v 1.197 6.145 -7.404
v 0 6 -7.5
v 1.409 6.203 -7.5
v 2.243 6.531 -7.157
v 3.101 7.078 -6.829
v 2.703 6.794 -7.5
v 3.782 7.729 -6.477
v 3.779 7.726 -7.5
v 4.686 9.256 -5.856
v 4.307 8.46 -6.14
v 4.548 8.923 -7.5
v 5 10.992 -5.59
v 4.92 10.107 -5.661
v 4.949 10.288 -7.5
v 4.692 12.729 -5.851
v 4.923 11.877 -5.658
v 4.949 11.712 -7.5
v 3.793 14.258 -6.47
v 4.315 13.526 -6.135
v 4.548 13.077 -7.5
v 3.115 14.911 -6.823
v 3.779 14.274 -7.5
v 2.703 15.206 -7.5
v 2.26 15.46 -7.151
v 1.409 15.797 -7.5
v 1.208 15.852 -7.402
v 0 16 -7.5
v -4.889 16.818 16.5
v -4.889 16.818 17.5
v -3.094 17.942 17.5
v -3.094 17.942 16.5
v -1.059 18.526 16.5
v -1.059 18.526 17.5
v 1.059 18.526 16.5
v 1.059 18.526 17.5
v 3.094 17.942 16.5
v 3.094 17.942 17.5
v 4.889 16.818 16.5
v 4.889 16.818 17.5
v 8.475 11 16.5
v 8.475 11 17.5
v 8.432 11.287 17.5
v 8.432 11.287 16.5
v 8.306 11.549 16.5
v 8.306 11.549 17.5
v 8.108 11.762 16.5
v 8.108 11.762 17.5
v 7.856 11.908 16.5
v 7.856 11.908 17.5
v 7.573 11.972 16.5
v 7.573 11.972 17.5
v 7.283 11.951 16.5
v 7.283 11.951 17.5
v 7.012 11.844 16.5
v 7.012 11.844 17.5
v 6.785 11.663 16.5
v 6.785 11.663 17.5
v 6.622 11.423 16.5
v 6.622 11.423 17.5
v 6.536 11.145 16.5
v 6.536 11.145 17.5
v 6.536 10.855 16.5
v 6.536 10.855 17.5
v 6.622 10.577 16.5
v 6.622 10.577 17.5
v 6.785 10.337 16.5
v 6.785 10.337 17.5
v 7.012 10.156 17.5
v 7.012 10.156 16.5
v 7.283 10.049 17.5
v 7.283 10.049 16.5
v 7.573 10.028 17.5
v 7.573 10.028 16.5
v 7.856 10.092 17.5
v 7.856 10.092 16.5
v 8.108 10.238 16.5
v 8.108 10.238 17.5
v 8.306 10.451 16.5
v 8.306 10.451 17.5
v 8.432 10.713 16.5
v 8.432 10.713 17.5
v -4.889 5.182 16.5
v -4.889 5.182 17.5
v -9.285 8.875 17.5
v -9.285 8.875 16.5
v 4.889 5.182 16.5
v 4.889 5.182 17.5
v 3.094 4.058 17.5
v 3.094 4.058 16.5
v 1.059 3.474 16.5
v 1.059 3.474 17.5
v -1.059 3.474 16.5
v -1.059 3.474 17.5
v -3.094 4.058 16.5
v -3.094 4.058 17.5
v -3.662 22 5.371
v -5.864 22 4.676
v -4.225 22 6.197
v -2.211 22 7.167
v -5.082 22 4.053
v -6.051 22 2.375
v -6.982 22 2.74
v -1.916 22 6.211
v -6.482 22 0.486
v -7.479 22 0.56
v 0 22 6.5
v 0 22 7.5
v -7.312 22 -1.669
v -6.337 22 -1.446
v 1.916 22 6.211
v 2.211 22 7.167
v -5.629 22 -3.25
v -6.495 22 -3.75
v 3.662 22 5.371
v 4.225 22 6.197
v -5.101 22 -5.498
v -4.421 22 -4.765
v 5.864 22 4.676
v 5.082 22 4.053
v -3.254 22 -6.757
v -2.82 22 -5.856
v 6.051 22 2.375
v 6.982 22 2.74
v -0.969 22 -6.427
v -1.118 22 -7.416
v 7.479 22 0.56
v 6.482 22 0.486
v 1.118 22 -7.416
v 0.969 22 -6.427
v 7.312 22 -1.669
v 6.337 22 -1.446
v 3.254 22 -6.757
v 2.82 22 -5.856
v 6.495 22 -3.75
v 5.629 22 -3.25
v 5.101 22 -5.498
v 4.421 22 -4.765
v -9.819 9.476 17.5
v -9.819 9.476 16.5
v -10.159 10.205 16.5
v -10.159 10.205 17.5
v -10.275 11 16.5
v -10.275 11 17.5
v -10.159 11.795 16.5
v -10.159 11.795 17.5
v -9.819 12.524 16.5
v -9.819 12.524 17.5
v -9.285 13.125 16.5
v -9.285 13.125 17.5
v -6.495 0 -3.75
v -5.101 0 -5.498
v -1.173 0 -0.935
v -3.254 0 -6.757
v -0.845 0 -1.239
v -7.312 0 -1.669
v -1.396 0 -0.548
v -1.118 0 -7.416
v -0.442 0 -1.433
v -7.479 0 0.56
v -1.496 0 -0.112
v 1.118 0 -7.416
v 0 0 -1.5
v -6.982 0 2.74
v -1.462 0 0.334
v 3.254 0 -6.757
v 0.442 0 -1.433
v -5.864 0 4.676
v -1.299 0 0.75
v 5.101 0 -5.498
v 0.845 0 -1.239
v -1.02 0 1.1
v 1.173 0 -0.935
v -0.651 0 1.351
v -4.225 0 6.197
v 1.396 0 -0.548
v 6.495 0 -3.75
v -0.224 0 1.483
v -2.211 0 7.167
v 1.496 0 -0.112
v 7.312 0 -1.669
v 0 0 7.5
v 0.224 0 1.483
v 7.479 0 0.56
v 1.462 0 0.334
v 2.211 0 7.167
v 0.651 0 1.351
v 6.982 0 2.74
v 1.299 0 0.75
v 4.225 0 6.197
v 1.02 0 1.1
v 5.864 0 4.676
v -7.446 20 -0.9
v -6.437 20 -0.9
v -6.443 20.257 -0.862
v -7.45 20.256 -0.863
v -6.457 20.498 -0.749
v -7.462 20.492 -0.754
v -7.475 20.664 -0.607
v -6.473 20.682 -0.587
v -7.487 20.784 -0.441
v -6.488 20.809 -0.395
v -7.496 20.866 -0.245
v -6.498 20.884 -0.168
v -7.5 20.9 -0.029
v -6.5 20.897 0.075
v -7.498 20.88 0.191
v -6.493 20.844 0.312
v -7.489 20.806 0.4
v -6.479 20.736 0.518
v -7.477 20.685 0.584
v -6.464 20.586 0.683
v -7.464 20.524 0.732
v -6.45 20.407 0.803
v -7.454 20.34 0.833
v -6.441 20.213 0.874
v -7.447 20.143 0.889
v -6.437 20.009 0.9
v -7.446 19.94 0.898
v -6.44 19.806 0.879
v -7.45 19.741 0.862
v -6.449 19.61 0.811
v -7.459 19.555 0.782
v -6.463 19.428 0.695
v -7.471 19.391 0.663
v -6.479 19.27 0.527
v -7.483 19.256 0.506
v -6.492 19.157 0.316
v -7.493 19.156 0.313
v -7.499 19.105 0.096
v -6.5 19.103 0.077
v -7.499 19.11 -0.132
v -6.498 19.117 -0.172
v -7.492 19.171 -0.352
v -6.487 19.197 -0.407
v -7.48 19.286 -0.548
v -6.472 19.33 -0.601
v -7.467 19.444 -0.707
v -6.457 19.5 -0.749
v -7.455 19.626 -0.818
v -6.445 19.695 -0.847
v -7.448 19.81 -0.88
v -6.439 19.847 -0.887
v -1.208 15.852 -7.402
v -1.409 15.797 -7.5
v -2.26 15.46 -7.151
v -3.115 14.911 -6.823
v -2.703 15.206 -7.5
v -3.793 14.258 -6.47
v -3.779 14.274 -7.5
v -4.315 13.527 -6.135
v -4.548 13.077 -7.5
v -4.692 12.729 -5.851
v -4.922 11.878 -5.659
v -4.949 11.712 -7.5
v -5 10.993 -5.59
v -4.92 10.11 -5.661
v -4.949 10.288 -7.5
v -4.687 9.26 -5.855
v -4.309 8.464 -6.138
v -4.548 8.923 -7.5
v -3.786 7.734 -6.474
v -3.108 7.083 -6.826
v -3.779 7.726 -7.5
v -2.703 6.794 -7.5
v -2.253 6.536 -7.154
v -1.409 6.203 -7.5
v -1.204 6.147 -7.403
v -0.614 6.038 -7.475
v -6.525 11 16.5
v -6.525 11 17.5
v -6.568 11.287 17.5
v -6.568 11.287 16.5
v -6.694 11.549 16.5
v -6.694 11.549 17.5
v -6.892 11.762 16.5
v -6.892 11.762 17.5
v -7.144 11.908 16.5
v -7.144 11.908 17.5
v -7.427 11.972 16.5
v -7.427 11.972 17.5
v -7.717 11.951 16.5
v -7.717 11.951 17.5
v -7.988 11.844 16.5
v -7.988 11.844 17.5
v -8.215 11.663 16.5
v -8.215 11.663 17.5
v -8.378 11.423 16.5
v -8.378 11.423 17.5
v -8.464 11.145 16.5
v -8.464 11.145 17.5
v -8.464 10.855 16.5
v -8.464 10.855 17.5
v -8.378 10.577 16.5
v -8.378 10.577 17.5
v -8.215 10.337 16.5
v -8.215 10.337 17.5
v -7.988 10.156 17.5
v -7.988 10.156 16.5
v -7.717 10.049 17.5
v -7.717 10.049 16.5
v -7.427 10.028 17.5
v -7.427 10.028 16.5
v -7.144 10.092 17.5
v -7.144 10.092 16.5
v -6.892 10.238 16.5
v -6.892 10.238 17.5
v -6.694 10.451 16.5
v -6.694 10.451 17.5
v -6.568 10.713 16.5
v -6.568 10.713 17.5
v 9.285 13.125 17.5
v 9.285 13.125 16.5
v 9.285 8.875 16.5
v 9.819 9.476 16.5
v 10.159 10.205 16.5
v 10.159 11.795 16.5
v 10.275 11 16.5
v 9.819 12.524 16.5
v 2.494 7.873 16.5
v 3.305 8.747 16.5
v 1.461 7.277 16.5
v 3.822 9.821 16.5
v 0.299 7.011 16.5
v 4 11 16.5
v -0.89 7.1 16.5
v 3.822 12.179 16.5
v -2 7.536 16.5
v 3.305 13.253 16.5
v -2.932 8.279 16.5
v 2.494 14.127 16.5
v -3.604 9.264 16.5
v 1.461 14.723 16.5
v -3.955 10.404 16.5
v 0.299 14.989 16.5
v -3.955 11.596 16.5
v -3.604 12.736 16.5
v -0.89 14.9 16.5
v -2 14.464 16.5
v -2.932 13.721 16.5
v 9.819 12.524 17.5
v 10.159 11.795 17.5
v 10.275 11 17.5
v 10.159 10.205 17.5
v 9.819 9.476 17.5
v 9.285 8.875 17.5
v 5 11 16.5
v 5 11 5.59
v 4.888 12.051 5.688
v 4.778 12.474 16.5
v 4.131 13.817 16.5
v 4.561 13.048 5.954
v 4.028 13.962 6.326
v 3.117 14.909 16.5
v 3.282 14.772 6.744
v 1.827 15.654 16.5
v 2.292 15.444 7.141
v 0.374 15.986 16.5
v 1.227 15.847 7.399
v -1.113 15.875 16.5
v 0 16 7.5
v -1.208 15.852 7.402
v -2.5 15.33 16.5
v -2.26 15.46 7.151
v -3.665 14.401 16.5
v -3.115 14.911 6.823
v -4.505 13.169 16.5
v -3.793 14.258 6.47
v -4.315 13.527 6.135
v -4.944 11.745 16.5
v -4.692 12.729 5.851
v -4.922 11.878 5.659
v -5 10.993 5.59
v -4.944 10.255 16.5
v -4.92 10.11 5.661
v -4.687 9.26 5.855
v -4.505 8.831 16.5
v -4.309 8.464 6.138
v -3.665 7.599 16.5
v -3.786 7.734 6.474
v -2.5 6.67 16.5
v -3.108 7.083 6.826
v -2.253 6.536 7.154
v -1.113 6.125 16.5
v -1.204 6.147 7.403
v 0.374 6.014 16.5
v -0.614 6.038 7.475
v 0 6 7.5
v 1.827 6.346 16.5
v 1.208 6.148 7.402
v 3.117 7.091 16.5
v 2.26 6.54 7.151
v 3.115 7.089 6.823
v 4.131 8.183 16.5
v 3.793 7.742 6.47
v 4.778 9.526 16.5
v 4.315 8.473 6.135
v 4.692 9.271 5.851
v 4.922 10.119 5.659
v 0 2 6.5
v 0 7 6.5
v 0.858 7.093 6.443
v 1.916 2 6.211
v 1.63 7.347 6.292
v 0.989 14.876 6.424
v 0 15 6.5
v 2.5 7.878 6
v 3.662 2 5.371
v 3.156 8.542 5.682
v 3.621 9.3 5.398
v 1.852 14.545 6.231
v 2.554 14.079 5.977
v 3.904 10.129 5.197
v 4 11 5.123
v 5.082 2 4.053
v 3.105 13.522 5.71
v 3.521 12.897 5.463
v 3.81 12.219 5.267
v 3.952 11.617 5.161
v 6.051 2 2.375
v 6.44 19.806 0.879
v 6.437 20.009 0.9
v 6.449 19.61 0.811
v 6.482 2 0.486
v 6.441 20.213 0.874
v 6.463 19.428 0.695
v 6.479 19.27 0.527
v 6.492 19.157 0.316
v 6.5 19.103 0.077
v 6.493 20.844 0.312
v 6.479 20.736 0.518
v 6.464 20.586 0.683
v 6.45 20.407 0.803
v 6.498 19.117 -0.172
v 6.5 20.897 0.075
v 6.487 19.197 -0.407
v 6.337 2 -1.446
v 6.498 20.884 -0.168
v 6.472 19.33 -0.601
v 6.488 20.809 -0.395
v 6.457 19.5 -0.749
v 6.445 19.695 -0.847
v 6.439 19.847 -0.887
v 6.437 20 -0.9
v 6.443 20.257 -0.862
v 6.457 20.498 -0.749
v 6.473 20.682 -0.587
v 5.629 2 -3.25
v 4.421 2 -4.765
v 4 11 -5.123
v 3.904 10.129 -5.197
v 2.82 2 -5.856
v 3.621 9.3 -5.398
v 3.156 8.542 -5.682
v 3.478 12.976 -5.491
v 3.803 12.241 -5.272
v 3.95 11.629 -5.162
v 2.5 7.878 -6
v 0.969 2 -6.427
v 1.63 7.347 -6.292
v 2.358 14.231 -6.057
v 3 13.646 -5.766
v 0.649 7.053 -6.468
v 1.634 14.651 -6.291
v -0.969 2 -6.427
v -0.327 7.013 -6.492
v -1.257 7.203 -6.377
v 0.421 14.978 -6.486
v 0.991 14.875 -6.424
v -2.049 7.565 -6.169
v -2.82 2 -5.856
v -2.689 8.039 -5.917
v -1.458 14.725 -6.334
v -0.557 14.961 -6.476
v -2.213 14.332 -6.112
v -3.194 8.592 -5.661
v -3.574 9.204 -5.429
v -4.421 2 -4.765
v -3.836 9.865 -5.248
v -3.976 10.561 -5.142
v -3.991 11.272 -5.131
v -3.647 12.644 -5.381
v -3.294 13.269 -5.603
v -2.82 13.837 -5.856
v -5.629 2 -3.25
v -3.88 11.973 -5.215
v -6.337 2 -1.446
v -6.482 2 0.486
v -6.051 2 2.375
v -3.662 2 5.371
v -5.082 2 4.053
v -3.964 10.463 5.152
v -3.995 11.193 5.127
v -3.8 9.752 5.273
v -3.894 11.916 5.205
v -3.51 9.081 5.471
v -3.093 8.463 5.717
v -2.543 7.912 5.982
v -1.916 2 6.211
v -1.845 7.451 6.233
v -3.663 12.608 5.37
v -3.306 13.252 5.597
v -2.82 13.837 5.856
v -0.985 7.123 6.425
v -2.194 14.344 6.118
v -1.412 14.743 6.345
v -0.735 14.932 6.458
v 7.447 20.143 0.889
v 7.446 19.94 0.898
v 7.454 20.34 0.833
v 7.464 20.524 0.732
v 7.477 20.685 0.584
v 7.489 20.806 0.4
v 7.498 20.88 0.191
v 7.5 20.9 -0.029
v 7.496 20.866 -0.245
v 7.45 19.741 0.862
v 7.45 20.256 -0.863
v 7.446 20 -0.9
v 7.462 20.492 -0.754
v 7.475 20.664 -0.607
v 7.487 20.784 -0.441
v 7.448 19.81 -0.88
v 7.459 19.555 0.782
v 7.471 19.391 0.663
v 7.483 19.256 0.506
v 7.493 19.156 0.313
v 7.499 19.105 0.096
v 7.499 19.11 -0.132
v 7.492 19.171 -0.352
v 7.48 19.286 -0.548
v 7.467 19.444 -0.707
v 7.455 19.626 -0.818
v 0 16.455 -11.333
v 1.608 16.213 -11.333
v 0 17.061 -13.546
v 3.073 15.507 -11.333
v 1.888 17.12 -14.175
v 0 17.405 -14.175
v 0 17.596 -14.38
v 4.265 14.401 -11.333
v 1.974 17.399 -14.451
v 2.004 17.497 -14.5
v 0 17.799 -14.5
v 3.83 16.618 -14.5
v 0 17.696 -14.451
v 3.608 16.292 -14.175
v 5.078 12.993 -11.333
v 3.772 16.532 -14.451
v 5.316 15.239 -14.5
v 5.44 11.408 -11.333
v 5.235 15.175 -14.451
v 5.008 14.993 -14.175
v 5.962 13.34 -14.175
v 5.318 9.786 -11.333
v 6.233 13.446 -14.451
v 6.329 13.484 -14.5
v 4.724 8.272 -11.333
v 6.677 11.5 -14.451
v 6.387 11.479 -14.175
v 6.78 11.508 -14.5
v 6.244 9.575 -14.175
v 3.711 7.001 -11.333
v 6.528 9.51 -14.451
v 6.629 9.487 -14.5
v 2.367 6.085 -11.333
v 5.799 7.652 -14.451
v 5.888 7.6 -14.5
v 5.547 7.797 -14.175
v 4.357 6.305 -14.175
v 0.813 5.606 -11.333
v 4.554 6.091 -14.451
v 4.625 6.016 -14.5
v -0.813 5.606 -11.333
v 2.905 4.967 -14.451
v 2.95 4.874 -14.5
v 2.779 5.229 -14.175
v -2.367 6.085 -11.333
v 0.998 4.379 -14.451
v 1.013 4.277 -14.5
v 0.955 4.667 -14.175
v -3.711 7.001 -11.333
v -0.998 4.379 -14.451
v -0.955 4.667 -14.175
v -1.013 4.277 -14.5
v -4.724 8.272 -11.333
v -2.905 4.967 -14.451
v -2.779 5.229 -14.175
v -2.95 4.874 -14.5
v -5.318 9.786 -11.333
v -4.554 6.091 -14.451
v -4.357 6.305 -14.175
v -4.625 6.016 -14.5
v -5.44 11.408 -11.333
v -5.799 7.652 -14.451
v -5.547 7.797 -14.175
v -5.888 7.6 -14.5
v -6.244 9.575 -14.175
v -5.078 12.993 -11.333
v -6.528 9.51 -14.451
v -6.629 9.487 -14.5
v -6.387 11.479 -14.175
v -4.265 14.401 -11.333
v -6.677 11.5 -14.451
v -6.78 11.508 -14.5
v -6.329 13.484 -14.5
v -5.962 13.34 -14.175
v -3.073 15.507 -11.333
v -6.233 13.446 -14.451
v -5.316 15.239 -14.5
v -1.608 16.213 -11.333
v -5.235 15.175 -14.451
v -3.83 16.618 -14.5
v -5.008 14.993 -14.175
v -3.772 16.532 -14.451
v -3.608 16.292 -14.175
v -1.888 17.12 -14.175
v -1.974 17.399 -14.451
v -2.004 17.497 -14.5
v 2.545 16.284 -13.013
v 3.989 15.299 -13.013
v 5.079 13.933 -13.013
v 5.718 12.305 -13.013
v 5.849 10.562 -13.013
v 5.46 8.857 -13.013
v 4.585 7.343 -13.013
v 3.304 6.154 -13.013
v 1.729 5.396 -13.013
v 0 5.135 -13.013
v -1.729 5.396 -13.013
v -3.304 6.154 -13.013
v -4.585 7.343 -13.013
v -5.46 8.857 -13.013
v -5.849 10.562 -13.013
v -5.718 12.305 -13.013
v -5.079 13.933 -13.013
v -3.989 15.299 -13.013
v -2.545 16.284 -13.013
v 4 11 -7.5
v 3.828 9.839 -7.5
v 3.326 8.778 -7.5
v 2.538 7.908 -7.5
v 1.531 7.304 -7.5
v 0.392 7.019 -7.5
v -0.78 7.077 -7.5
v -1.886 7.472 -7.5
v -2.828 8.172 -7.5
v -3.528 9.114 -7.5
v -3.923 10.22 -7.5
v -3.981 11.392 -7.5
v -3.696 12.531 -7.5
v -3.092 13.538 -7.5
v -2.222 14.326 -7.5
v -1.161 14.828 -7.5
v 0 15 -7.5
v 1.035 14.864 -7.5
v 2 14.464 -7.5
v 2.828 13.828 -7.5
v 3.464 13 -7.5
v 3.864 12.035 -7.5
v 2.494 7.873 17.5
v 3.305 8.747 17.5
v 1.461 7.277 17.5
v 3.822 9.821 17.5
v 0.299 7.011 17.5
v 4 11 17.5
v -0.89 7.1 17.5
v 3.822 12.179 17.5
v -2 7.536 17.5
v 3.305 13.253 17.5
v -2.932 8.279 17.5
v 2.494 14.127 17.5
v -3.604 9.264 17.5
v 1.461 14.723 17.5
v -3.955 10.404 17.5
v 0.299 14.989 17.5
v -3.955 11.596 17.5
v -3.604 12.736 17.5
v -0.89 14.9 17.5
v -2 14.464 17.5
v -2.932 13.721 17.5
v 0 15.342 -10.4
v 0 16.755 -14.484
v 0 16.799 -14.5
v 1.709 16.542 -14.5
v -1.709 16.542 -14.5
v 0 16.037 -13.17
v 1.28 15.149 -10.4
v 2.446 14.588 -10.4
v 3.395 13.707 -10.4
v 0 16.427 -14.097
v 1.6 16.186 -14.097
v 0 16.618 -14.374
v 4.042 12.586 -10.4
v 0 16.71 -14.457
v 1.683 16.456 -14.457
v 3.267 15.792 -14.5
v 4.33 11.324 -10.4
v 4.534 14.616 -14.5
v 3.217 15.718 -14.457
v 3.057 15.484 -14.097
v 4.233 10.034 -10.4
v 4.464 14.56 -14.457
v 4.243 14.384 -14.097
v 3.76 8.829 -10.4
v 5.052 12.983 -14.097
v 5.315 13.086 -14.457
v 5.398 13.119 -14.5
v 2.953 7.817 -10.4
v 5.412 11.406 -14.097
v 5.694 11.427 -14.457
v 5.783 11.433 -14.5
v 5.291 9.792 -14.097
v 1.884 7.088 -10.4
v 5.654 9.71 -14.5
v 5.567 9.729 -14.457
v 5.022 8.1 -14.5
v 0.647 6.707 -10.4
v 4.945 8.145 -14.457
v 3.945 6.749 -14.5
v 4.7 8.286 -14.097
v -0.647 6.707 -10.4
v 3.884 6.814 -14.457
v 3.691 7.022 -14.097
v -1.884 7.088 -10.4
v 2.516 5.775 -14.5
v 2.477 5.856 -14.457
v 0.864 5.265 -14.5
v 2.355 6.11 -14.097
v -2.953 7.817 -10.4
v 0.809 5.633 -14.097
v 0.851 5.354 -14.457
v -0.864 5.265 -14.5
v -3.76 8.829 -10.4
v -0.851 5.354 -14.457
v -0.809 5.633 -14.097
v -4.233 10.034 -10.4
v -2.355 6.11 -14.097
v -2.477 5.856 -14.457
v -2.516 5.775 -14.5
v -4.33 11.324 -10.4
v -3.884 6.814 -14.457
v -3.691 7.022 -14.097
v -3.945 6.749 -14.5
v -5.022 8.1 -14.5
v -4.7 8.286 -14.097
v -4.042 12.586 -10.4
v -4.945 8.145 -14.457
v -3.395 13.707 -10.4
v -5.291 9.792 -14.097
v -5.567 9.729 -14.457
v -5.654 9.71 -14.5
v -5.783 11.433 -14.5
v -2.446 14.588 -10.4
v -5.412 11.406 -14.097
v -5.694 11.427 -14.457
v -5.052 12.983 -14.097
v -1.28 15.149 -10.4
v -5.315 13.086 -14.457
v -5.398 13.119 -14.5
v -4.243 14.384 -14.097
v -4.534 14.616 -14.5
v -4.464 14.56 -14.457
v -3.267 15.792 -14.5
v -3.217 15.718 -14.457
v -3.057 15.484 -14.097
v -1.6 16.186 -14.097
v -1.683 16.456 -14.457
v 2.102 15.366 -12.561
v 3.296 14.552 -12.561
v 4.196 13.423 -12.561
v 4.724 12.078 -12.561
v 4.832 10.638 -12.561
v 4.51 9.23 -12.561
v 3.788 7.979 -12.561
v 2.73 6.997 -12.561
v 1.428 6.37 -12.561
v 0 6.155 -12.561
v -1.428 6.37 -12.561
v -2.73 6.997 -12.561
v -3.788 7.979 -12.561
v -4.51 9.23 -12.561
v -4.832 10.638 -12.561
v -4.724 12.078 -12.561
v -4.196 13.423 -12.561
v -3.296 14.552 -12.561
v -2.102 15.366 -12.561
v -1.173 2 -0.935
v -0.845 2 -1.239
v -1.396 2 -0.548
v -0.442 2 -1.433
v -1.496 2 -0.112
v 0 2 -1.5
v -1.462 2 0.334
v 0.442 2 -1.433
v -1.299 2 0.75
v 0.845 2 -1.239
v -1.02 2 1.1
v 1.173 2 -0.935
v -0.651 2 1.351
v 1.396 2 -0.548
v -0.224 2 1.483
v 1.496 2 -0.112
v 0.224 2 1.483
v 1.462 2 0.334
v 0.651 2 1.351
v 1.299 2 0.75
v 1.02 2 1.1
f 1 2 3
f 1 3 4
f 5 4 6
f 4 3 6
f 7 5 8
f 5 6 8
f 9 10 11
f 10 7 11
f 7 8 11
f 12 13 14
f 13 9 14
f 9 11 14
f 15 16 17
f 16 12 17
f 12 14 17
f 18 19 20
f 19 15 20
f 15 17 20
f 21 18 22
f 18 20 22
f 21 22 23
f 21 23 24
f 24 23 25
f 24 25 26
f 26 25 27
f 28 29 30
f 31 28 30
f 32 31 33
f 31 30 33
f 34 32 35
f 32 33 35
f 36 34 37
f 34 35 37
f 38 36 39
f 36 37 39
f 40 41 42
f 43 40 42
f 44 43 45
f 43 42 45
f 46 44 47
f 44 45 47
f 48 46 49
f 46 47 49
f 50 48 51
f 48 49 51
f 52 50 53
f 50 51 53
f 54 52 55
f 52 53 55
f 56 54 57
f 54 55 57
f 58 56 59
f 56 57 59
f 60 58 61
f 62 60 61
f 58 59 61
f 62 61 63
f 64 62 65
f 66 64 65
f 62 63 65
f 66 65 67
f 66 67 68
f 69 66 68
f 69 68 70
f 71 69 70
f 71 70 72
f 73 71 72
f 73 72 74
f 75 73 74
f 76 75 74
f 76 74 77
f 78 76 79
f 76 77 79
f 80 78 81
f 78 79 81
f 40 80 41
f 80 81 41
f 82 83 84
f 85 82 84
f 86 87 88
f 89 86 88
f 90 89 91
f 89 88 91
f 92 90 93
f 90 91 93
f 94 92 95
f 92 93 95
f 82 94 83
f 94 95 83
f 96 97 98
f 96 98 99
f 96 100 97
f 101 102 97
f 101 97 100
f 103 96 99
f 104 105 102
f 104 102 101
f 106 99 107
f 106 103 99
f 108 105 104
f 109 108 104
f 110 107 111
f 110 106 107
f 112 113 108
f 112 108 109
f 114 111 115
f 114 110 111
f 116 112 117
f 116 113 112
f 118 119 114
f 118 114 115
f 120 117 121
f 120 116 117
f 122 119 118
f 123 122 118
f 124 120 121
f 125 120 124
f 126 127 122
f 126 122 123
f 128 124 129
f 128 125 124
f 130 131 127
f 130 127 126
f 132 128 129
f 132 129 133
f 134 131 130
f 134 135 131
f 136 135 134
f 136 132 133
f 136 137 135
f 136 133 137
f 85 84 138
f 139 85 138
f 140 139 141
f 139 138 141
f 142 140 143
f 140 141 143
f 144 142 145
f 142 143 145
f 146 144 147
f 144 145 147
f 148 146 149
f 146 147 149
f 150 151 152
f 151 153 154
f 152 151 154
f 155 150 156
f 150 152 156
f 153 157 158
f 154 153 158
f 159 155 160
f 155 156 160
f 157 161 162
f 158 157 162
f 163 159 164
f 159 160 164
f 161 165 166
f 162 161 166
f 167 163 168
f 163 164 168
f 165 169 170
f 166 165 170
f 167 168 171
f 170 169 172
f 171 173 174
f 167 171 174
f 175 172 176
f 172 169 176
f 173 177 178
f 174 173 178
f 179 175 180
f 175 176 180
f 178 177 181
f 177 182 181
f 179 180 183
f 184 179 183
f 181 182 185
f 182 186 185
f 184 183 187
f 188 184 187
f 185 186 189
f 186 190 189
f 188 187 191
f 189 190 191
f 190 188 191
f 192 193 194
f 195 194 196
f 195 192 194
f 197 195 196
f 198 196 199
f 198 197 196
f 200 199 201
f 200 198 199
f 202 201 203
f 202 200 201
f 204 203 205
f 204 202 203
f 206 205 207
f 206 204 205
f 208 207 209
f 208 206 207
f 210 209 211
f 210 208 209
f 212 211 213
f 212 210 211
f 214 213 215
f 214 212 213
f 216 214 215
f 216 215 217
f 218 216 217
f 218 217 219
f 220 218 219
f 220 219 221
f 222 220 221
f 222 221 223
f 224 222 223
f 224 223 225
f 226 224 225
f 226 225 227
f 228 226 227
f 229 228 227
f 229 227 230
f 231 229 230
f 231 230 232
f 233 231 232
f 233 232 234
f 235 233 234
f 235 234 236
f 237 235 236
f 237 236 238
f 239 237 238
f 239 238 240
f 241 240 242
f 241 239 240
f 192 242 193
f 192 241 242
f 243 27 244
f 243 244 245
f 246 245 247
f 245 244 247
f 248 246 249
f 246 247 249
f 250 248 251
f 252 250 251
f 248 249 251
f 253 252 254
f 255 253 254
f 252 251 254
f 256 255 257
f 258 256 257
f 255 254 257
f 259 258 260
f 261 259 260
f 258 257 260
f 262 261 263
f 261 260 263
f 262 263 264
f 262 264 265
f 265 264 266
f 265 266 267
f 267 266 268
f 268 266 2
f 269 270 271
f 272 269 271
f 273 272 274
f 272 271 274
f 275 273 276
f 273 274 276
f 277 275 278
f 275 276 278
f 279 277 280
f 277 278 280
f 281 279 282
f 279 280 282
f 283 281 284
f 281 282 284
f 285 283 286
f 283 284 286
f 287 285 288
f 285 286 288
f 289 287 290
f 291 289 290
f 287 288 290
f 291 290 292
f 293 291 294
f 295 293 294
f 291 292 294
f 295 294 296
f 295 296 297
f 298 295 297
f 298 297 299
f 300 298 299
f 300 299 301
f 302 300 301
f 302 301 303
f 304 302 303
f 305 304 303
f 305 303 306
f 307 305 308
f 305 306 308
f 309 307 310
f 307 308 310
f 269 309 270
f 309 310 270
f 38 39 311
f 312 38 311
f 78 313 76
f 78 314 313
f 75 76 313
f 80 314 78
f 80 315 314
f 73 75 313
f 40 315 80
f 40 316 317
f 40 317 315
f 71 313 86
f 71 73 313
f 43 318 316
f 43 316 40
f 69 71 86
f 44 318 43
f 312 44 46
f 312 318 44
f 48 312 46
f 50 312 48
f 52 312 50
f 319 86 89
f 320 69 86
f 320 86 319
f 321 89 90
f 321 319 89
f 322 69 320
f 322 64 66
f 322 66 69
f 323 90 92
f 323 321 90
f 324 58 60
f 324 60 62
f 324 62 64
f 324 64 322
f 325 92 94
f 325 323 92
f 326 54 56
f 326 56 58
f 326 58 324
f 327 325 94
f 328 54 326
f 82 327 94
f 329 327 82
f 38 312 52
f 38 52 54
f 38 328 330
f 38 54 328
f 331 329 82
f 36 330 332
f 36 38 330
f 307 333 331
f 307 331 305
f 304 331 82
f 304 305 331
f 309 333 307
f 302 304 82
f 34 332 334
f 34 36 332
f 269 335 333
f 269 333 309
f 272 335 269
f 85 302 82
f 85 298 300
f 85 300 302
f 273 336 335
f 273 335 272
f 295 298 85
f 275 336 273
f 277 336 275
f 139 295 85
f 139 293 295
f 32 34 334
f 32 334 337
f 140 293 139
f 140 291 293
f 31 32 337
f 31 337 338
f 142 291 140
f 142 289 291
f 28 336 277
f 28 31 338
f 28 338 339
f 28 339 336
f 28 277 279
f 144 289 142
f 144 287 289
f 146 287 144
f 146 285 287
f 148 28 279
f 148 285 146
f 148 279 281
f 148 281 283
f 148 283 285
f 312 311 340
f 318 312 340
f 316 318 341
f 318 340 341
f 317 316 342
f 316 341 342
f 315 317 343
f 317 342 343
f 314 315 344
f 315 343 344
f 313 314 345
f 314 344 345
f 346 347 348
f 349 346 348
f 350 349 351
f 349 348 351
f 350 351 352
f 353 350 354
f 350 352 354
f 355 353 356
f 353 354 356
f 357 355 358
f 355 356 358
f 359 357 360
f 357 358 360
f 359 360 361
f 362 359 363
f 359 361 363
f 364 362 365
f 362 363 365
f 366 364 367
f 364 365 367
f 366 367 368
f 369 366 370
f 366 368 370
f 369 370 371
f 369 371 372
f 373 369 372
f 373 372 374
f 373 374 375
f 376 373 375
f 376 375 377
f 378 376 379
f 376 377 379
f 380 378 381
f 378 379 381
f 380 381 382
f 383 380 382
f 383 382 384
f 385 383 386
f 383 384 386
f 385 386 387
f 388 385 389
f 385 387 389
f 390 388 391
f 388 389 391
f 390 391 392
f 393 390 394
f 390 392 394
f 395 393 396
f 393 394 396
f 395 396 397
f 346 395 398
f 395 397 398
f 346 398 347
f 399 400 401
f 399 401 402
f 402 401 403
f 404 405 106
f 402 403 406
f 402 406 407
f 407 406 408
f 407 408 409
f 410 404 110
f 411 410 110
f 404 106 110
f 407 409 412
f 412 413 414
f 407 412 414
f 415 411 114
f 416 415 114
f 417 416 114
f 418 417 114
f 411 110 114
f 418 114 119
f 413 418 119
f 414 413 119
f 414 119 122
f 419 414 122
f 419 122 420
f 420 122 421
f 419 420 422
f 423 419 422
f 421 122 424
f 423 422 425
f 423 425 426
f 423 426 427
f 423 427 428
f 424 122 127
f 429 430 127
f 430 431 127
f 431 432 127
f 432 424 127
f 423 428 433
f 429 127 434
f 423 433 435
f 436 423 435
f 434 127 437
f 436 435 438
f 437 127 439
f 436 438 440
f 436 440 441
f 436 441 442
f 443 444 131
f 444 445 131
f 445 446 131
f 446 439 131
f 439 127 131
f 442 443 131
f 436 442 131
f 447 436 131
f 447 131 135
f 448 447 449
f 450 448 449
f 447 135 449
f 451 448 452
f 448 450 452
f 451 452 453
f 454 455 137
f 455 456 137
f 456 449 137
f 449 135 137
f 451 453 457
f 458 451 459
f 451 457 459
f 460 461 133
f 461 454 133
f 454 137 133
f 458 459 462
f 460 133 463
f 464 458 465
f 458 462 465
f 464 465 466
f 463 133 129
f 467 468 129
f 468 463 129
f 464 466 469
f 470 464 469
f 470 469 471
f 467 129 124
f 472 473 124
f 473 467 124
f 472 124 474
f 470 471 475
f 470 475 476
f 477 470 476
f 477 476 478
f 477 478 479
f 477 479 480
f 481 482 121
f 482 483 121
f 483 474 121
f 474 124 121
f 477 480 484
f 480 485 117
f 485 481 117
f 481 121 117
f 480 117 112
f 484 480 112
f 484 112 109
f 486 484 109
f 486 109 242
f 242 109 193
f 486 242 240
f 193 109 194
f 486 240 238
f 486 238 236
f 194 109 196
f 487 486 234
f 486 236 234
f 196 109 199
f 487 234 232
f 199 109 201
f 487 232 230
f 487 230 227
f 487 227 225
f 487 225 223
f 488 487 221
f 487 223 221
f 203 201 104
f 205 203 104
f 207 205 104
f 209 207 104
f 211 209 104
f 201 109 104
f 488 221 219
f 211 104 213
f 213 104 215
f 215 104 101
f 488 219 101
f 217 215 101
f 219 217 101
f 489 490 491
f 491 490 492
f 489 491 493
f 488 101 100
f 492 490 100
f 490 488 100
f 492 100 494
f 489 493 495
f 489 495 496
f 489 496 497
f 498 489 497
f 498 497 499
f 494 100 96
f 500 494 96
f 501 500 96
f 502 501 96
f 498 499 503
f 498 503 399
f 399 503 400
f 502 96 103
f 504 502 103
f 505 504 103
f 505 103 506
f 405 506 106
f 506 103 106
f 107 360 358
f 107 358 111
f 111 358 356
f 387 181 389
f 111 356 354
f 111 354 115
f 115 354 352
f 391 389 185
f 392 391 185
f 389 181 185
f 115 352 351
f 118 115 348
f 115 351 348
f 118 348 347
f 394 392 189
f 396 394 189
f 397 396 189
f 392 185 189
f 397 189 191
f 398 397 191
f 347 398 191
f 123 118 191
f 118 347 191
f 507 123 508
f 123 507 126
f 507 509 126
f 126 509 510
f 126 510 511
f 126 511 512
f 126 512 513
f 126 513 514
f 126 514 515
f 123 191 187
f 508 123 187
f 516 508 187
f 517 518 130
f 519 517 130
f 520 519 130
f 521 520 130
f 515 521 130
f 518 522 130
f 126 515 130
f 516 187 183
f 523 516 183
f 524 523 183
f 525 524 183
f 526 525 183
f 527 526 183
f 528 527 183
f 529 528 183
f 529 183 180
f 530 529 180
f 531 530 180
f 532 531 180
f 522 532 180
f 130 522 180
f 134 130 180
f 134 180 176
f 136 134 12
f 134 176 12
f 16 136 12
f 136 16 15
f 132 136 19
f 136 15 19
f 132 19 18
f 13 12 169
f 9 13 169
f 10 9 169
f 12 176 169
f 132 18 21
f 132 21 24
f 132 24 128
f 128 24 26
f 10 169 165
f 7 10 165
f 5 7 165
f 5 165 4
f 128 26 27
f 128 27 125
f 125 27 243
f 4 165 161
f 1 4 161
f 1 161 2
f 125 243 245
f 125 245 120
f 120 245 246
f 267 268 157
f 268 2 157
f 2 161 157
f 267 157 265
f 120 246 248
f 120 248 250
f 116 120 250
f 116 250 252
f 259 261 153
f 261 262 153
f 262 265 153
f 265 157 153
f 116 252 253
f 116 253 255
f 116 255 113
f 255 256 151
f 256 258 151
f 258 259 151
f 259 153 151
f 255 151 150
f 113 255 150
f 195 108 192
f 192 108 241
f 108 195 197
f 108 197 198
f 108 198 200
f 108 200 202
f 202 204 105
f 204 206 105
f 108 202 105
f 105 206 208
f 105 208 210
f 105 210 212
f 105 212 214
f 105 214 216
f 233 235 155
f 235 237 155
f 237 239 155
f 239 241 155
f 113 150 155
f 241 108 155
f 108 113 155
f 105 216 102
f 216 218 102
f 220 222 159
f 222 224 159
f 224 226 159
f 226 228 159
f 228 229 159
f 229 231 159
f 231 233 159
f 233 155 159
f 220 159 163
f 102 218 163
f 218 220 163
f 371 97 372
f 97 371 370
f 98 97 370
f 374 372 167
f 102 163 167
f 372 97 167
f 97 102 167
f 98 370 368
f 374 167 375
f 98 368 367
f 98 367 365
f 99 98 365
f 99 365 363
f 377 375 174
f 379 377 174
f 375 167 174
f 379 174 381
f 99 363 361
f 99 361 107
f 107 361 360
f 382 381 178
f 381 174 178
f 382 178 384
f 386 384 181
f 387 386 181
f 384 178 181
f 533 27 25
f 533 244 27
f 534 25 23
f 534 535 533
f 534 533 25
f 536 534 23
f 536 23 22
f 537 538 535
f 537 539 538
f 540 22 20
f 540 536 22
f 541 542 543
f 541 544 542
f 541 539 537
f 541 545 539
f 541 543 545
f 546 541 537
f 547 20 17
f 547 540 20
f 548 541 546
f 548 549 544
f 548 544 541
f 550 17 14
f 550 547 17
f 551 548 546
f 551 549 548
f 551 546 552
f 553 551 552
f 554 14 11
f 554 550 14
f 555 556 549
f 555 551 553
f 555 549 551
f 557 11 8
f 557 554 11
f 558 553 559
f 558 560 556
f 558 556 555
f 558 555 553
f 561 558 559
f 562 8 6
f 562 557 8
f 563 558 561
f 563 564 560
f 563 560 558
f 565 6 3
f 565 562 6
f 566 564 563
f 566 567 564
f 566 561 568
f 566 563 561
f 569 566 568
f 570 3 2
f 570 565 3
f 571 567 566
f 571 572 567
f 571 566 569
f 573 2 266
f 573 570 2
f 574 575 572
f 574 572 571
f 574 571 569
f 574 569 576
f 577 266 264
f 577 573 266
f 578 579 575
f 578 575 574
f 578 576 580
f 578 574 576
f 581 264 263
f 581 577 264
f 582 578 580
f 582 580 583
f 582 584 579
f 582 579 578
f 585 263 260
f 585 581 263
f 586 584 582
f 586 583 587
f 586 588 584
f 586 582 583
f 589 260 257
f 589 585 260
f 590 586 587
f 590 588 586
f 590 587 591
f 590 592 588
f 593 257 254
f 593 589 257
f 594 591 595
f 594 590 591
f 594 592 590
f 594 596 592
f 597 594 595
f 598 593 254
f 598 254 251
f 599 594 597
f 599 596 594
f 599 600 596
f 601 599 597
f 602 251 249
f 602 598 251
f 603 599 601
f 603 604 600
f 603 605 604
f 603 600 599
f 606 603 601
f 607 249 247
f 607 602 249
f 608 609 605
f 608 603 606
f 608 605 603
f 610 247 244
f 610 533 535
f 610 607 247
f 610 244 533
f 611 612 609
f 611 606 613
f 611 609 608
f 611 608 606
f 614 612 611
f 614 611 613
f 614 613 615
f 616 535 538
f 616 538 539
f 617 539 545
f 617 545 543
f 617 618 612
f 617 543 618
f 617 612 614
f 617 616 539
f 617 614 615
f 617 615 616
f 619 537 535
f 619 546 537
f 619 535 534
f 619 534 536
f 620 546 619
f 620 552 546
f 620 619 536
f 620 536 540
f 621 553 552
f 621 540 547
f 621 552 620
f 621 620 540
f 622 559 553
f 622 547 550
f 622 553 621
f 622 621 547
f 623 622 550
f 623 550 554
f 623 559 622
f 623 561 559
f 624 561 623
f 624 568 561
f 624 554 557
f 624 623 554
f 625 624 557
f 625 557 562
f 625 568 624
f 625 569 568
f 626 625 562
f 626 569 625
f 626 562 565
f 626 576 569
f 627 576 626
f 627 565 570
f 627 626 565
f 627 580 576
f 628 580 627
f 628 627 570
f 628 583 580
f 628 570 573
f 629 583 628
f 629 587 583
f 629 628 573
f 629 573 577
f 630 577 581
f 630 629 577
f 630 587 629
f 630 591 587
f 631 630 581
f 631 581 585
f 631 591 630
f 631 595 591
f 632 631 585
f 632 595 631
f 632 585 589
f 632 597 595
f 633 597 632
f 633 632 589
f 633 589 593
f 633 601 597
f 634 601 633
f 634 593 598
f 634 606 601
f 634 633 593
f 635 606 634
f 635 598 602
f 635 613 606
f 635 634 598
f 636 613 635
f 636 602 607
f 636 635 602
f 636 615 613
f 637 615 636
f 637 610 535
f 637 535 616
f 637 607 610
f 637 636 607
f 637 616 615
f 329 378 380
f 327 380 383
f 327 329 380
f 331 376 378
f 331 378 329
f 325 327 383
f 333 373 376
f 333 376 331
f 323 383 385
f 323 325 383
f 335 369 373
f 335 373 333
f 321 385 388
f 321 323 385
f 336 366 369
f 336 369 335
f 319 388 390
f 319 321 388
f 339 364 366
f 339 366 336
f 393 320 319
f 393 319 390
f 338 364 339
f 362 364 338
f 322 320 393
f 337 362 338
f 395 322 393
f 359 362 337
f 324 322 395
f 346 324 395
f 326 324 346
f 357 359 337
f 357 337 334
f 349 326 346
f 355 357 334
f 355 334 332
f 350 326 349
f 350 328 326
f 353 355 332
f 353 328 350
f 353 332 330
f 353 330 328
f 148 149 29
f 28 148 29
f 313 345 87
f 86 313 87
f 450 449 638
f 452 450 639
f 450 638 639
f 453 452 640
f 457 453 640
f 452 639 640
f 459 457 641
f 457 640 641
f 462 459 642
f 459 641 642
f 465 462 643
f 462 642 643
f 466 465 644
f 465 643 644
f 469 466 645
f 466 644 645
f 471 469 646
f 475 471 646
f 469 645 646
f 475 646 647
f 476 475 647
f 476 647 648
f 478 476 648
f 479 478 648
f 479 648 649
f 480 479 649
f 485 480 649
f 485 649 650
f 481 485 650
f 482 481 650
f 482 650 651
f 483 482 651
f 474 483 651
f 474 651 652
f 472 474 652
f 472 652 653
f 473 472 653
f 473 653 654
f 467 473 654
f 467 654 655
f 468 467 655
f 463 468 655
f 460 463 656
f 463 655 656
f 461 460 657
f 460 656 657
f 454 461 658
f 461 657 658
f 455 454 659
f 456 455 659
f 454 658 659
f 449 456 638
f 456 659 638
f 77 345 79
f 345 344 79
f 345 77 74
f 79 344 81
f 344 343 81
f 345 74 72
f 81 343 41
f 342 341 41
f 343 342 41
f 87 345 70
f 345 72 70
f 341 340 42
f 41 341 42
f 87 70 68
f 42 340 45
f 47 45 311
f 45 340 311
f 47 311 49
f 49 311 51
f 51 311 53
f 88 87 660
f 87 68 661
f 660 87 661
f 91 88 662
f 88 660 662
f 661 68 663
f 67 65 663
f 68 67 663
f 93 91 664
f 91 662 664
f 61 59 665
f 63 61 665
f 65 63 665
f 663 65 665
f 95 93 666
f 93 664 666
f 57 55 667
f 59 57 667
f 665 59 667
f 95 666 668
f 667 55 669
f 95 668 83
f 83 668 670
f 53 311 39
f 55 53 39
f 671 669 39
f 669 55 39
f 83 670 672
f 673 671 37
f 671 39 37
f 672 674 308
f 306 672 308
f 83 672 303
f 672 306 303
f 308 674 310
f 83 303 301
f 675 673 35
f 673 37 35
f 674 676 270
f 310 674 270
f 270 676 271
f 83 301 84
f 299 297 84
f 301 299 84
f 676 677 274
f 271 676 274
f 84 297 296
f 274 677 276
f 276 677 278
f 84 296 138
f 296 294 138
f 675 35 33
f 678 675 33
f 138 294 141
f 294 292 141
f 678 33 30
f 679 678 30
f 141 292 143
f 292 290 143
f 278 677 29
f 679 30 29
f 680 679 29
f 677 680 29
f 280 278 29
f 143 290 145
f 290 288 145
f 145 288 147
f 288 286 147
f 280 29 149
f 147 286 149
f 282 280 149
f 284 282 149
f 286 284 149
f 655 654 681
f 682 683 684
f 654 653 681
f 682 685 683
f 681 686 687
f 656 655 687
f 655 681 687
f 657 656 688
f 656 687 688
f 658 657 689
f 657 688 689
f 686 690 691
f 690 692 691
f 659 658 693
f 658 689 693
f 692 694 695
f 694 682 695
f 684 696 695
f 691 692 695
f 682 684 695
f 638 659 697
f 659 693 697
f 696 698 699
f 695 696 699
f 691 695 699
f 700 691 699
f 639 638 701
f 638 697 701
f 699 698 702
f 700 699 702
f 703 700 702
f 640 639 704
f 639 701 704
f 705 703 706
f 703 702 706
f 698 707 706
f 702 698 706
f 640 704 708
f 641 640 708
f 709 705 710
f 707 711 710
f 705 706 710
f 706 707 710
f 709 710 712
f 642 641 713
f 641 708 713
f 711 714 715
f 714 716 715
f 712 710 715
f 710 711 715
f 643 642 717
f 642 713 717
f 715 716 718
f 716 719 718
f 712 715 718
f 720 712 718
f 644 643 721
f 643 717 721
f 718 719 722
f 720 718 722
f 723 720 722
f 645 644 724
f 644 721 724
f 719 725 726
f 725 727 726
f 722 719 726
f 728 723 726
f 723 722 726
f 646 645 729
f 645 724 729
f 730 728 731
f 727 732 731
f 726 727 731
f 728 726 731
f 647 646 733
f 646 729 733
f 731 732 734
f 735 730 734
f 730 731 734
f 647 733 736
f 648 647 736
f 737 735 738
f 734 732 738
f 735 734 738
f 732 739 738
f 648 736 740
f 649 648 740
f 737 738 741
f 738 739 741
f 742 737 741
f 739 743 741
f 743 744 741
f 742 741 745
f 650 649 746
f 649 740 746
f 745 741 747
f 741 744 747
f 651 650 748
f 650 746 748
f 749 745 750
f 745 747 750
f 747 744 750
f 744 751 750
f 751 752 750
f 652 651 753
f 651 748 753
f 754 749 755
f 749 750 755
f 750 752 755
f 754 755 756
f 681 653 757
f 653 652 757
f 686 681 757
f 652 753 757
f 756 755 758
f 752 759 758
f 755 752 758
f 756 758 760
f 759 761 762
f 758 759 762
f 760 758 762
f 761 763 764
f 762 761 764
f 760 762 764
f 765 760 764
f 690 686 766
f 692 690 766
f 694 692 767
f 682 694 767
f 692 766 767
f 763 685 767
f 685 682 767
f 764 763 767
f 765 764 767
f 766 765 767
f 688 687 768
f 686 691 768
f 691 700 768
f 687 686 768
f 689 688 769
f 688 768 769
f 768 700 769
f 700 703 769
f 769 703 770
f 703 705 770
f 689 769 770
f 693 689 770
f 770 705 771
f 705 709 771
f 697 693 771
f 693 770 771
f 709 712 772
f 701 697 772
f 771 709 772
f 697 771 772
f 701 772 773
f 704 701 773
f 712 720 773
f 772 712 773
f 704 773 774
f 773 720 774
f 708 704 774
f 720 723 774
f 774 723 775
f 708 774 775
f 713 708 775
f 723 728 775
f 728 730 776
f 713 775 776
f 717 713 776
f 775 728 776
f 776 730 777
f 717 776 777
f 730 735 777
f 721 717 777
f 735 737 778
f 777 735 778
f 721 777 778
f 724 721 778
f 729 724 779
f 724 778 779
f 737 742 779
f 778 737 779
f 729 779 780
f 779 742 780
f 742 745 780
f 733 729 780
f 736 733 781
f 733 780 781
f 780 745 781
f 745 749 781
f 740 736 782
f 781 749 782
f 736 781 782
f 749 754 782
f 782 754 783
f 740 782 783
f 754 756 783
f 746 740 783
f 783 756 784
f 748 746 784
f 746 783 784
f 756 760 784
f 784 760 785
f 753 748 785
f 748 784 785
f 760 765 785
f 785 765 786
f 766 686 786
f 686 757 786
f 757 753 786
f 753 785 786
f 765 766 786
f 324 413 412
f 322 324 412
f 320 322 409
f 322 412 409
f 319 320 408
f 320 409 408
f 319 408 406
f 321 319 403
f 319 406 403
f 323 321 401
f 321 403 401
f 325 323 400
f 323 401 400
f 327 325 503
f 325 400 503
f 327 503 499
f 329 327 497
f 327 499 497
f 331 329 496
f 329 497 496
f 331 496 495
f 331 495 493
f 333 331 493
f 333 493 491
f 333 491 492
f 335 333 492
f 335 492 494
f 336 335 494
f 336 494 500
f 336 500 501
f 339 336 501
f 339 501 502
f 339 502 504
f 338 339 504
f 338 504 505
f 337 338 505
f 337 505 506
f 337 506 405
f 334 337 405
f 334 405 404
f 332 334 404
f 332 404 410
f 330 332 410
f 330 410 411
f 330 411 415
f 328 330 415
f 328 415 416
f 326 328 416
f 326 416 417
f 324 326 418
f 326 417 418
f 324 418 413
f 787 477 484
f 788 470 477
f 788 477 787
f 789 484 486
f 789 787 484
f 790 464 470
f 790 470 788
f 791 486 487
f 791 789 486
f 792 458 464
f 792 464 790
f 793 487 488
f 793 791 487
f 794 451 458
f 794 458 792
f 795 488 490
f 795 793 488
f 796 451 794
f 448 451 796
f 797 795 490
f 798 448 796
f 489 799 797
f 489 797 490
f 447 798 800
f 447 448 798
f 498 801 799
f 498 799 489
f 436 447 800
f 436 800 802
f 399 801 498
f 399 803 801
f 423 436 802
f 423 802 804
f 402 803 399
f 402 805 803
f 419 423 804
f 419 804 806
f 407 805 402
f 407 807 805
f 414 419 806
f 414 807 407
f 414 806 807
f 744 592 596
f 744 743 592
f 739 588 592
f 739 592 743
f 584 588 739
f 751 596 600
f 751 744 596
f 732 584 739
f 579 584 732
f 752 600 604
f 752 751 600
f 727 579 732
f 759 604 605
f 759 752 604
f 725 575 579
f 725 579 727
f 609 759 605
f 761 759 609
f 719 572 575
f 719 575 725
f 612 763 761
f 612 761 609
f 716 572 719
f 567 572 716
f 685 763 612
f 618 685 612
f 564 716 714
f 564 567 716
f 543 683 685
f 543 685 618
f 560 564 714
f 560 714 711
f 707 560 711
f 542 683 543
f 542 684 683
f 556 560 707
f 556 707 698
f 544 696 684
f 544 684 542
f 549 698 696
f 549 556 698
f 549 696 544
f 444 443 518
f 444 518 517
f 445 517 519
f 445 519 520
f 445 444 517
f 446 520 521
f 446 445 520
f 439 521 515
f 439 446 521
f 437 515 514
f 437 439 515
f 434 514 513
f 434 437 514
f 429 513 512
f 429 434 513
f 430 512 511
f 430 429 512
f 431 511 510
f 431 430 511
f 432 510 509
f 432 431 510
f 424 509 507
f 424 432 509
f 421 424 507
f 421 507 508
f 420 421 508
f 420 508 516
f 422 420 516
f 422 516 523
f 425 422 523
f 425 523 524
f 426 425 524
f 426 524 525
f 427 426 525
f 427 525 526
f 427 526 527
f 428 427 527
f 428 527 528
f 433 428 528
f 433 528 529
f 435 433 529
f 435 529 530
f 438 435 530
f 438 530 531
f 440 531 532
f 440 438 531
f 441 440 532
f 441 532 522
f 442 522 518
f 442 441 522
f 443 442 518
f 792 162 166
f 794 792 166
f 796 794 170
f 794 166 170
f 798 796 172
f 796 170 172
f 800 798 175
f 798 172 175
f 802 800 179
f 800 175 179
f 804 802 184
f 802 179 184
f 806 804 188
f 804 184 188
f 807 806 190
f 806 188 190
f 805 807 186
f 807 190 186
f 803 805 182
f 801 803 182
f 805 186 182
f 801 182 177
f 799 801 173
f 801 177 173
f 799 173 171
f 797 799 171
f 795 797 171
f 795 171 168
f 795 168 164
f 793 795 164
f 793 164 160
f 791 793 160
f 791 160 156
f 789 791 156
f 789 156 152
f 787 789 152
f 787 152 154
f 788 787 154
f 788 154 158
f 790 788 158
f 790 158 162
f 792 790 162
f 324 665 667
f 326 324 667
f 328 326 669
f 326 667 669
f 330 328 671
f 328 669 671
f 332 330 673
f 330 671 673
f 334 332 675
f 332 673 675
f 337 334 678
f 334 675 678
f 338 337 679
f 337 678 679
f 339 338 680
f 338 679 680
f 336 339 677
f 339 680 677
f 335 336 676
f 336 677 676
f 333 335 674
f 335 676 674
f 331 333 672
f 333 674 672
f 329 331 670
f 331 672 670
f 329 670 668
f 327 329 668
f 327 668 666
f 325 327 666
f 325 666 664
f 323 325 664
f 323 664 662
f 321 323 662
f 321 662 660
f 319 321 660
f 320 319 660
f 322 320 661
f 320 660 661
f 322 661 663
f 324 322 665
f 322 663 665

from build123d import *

# Parameters (mm, degrees)
SKETCH1_R                = 7.5
SKETCH1_R_2              = 6.5
BOSS_EXTRUDE1_DEPTH      = 22
BOSS_EXTRUDE2_START      = 17.5
SKETCH2_R                = 4
SKETCH2_R_2              = 0.975
BOSS_EXTRUDE2_DEPTH      = 1
BOSS_EXTRUDE3_DEPTH      = 16.5
BOSS_EXTRUDE3_DEPTH_BACK = 7.5
SKETCH3_R                = 5
SKETCH9_R                = 4
CUT_EXTRUDE1_DEPTH       = 35.85076225
SKETCH11_R               = 6.5
BOSS_EXTRUDE5_DEPTH      = 22
SKETCH12_R               = 6.5
CUT_EXTRUDE2_DEPTH       = 20
SKETCH13_R               = 1.5
CUT_EXTRUDE3_DEPTH       = 30.930346296
CUT_EXTRUDE4_DEPTH       = 30.930346296
CUT_EXTRUDE4_DEPTH_BACK  = 30.930346296
SKETCH14_R               = 0.9


with BuildPart() as part:
    # Sketch1 → Boss-Extrude1 (new body)
    with BuildSketch(Plane(origin=(0, 0, 0), x_dir=(1, 0, 0), z_dir=(0, 1, 0))):
        with Locations(Location((0, 0, 0), (0, 0, 270))):
            Circle(SKETCH1_R)
        with Locations(Location((0, 0, 0), (0, 0, 270))):
            Circle(SKETCH1_R_2, mode=Mode.SUBTRACT)
    extrude(amount=BOSS_EXTRUDE1_DEPTH)



with BuildPart() as body_2:
    # Sketch2 → Boss-Extrude2 (new body)
    with BuildSketch(Plane.XY.offset(BOSS_EXTRUDE2_START)):
        with BuildLine():
            Line((-9.28525, 13.124501692), (-4.889333333, 16.818455083))
            ThreePointArc((-4.889333333, 16.818455083), (0, 18.6), (4.889333333, 16.818455083))
            Line((4.889333333, 16.818455083), (9.28525, 13.124501692))
            ThreePointArc((9.28525, 13.124501692), (10.275, 11), (9.28525, 8.875498308))
            Line((9.28525, 8.875498308), (4.889333333, 5.181544917))
            ThreePointArc((4.889333333, 5.181544917), (0, 3.4), (-4.889333333, 5.181544917))
            Line((-4.889333333, 5.181544917), (-9.28525, 8.875498308))
            ThreePointArc((-9.28525, 8.875498308), (-10.275, 11), (-9.28525, 13.124501692))
        make_face()
        with Locations((0, 11)):
            Circle(SKETCH2_R, mode=Mode.SUBTRACT)
        with Locations((-7.5, 11)):
            Circle(SKETCH2_R_2, mode=Mode.SUBTRACT)
        with Locations((7.5, 11)):
            Circle(SKETCH2_R_2, mode=Mode.SUBTRACT)
    extrude(amount=-BOSS_EXTRUDE2_DEPTH)


with BuildPart() as body_3:
    # Sketch3 → Boss-Extrude3 (new, two sides: drawn at the far end of the back side and taken through both)
    with BuildSketch(Plane.XY.offset(-BOSS_EXTRUDE3_DEPTH_BACK)):
        with Locations((0, 11)):
            Circle(SKETCH3_R)
    extrude(amount=BOSS_EXTRUDE3_DEPTH + BOSS_EXTRUDE3_DEPTH_BACK)


with BuildPart() as part_1:
    add(part.part)

    add(body_3.part)  # Revolve1 merges body 3
    # Sketch8 → Revolve1 (revolve)
    with BuildSketch(Plane(origin=(0, 0, 0), x_dir=(0, 0, -1), z_dir=(1, 0, 0))):
        with BuildLine():
            Line((14.5, 17.799305288), (14.5, 16.799305288))
            add(Edge.make_bspline(
                [(7.5, 15), (10.027506541, 15.070845427), (14.326887273, 16.097322761), (14.5, 16.799305288)],
                knots=[0, 0, 0, 0, 1, 1, 1, 1], degree=3))
            Line((7.5, 15), (7.5, 16))
            add(Edge.make_bspline(
                [(7.5, 16), (10.027523271, 16.145992602), (14.116044918, 16.720481547), (14.5, 17.799305288)],
                knots=[0, 0, 0, 0, 1, 1, 1, 1], degree=3))
        make_face()
    revolve(axis=Axis((0, 11, -7.5), (0, 0, -1)))

    # Sketch9 → Cut-Extrude1 (cut, through all)
    with BuildSketch(Plane(origin=(0, 0, -7.5), x_dir=(-1, 0, 0), z_dir=(0, 0, -1))):
        with Locations(Location((0, 11, 0), (0, 0, 180))):
            Circle(SKETCH9_R)
    extrude(amount=-CUT_EXTRUDE1_DEPTH, mode=Mode.SUBTRACT)

    # Sketch11 → Boss-Extrude5 (add, through all)
    with BuildSketch(Plane(origin=(0, 22, 0), x_dir=(1, 0, 0), z_dir=(0, 1, 0))):
        Circle(SKETCH11_R)
    extrude(amount=-BOSS_EXTRUDE5_DEPTH)

    # Sketch12 → Cut-Extrude2 (cut)
    with BuildSketch(Plane(origin=(0, 22, 0), x_dir=(1, 0, 0), z_dir=(0, 1, 0))):
        with Locations(Location((0, 0, 0), (0, 0, 270))):
            Circle(SKETCH12_R)
    extrude(amount=-CUT_EXTRUDE2_DEPTH, mode=Mode.SUBTRACT)

    # Sketch13 → Cut-Extrude3 (cut, through all)
    with BuildSketch(Plane.XZ):
        with Locations(Location((0, 0, 0), (0, 0, 270))):
            Circle(SKETCH13_R)
    extrude(amount=-CUT_EXTRUDE3_DEPTH, mode=Mode.SUBTRACT)

    # Sketch14 → Cut-Extrude4 (cut, two sides: drawn at the far end of the back side and taken through both)
    with BuildSketch(Plane(origin=(0, 0, 0), x_dir=(0, 0, -1), z_dir=(1, 0, 0)).offset(-CUT_EXTRUDE4_DEPTH_BACK)):
        with Locations((0, 20)):
            Circle(SKETCH14_R)
    extrude(amount=CUT_EXTRUDE4_DEPTH + CUT_EXTRUDE4_DEPTH_BACK, mode=Mode.SUBTRACT)


solid = Compound([body_2.part, part_1.part])
